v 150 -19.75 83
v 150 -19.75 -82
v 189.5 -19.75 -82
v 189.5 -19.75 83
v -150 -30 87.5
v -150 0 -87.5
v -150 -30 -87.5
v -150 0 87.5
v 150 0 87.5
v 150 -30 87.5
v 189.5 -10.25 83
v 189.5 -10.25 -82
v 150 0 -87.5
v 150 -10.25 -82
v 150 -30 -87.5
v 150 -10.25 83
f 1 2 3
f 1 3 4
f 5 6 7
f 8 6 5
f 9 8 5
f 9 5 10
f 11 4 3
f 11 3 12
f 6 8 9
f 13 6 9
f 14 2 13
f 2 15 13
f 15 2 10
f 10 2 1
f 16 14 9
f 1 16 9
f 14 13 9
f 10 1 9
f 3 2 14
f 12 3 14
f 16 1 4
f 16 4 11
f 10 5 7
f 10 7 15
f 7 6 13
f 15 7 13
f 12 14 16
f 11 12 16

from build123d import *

# Parameters (mm, degrees)
F0_W     = 300
F0_H     = 175
F1_DEPTH = 30
F2_W     = 9.5
F2_H     = 165
F3_DEPTH = 39.5


with BuildPart() as f1:
    # F0 (on Front) → F1 (new body)
    with BuildSketch(Plane.XZ):
        Rectangle(F0_W, F0_H)
    extrude(amount=F1_DEPTH)

    # F2 (on face) → F3 (join)
    with BuildSketch(Plane.YZ.offset(150)):
        with Locations((-15, 0.5)):
            Rectangle(F2_W, F2_H)
    extrude(amount=F3_DEPTH)


solid = f1.part
